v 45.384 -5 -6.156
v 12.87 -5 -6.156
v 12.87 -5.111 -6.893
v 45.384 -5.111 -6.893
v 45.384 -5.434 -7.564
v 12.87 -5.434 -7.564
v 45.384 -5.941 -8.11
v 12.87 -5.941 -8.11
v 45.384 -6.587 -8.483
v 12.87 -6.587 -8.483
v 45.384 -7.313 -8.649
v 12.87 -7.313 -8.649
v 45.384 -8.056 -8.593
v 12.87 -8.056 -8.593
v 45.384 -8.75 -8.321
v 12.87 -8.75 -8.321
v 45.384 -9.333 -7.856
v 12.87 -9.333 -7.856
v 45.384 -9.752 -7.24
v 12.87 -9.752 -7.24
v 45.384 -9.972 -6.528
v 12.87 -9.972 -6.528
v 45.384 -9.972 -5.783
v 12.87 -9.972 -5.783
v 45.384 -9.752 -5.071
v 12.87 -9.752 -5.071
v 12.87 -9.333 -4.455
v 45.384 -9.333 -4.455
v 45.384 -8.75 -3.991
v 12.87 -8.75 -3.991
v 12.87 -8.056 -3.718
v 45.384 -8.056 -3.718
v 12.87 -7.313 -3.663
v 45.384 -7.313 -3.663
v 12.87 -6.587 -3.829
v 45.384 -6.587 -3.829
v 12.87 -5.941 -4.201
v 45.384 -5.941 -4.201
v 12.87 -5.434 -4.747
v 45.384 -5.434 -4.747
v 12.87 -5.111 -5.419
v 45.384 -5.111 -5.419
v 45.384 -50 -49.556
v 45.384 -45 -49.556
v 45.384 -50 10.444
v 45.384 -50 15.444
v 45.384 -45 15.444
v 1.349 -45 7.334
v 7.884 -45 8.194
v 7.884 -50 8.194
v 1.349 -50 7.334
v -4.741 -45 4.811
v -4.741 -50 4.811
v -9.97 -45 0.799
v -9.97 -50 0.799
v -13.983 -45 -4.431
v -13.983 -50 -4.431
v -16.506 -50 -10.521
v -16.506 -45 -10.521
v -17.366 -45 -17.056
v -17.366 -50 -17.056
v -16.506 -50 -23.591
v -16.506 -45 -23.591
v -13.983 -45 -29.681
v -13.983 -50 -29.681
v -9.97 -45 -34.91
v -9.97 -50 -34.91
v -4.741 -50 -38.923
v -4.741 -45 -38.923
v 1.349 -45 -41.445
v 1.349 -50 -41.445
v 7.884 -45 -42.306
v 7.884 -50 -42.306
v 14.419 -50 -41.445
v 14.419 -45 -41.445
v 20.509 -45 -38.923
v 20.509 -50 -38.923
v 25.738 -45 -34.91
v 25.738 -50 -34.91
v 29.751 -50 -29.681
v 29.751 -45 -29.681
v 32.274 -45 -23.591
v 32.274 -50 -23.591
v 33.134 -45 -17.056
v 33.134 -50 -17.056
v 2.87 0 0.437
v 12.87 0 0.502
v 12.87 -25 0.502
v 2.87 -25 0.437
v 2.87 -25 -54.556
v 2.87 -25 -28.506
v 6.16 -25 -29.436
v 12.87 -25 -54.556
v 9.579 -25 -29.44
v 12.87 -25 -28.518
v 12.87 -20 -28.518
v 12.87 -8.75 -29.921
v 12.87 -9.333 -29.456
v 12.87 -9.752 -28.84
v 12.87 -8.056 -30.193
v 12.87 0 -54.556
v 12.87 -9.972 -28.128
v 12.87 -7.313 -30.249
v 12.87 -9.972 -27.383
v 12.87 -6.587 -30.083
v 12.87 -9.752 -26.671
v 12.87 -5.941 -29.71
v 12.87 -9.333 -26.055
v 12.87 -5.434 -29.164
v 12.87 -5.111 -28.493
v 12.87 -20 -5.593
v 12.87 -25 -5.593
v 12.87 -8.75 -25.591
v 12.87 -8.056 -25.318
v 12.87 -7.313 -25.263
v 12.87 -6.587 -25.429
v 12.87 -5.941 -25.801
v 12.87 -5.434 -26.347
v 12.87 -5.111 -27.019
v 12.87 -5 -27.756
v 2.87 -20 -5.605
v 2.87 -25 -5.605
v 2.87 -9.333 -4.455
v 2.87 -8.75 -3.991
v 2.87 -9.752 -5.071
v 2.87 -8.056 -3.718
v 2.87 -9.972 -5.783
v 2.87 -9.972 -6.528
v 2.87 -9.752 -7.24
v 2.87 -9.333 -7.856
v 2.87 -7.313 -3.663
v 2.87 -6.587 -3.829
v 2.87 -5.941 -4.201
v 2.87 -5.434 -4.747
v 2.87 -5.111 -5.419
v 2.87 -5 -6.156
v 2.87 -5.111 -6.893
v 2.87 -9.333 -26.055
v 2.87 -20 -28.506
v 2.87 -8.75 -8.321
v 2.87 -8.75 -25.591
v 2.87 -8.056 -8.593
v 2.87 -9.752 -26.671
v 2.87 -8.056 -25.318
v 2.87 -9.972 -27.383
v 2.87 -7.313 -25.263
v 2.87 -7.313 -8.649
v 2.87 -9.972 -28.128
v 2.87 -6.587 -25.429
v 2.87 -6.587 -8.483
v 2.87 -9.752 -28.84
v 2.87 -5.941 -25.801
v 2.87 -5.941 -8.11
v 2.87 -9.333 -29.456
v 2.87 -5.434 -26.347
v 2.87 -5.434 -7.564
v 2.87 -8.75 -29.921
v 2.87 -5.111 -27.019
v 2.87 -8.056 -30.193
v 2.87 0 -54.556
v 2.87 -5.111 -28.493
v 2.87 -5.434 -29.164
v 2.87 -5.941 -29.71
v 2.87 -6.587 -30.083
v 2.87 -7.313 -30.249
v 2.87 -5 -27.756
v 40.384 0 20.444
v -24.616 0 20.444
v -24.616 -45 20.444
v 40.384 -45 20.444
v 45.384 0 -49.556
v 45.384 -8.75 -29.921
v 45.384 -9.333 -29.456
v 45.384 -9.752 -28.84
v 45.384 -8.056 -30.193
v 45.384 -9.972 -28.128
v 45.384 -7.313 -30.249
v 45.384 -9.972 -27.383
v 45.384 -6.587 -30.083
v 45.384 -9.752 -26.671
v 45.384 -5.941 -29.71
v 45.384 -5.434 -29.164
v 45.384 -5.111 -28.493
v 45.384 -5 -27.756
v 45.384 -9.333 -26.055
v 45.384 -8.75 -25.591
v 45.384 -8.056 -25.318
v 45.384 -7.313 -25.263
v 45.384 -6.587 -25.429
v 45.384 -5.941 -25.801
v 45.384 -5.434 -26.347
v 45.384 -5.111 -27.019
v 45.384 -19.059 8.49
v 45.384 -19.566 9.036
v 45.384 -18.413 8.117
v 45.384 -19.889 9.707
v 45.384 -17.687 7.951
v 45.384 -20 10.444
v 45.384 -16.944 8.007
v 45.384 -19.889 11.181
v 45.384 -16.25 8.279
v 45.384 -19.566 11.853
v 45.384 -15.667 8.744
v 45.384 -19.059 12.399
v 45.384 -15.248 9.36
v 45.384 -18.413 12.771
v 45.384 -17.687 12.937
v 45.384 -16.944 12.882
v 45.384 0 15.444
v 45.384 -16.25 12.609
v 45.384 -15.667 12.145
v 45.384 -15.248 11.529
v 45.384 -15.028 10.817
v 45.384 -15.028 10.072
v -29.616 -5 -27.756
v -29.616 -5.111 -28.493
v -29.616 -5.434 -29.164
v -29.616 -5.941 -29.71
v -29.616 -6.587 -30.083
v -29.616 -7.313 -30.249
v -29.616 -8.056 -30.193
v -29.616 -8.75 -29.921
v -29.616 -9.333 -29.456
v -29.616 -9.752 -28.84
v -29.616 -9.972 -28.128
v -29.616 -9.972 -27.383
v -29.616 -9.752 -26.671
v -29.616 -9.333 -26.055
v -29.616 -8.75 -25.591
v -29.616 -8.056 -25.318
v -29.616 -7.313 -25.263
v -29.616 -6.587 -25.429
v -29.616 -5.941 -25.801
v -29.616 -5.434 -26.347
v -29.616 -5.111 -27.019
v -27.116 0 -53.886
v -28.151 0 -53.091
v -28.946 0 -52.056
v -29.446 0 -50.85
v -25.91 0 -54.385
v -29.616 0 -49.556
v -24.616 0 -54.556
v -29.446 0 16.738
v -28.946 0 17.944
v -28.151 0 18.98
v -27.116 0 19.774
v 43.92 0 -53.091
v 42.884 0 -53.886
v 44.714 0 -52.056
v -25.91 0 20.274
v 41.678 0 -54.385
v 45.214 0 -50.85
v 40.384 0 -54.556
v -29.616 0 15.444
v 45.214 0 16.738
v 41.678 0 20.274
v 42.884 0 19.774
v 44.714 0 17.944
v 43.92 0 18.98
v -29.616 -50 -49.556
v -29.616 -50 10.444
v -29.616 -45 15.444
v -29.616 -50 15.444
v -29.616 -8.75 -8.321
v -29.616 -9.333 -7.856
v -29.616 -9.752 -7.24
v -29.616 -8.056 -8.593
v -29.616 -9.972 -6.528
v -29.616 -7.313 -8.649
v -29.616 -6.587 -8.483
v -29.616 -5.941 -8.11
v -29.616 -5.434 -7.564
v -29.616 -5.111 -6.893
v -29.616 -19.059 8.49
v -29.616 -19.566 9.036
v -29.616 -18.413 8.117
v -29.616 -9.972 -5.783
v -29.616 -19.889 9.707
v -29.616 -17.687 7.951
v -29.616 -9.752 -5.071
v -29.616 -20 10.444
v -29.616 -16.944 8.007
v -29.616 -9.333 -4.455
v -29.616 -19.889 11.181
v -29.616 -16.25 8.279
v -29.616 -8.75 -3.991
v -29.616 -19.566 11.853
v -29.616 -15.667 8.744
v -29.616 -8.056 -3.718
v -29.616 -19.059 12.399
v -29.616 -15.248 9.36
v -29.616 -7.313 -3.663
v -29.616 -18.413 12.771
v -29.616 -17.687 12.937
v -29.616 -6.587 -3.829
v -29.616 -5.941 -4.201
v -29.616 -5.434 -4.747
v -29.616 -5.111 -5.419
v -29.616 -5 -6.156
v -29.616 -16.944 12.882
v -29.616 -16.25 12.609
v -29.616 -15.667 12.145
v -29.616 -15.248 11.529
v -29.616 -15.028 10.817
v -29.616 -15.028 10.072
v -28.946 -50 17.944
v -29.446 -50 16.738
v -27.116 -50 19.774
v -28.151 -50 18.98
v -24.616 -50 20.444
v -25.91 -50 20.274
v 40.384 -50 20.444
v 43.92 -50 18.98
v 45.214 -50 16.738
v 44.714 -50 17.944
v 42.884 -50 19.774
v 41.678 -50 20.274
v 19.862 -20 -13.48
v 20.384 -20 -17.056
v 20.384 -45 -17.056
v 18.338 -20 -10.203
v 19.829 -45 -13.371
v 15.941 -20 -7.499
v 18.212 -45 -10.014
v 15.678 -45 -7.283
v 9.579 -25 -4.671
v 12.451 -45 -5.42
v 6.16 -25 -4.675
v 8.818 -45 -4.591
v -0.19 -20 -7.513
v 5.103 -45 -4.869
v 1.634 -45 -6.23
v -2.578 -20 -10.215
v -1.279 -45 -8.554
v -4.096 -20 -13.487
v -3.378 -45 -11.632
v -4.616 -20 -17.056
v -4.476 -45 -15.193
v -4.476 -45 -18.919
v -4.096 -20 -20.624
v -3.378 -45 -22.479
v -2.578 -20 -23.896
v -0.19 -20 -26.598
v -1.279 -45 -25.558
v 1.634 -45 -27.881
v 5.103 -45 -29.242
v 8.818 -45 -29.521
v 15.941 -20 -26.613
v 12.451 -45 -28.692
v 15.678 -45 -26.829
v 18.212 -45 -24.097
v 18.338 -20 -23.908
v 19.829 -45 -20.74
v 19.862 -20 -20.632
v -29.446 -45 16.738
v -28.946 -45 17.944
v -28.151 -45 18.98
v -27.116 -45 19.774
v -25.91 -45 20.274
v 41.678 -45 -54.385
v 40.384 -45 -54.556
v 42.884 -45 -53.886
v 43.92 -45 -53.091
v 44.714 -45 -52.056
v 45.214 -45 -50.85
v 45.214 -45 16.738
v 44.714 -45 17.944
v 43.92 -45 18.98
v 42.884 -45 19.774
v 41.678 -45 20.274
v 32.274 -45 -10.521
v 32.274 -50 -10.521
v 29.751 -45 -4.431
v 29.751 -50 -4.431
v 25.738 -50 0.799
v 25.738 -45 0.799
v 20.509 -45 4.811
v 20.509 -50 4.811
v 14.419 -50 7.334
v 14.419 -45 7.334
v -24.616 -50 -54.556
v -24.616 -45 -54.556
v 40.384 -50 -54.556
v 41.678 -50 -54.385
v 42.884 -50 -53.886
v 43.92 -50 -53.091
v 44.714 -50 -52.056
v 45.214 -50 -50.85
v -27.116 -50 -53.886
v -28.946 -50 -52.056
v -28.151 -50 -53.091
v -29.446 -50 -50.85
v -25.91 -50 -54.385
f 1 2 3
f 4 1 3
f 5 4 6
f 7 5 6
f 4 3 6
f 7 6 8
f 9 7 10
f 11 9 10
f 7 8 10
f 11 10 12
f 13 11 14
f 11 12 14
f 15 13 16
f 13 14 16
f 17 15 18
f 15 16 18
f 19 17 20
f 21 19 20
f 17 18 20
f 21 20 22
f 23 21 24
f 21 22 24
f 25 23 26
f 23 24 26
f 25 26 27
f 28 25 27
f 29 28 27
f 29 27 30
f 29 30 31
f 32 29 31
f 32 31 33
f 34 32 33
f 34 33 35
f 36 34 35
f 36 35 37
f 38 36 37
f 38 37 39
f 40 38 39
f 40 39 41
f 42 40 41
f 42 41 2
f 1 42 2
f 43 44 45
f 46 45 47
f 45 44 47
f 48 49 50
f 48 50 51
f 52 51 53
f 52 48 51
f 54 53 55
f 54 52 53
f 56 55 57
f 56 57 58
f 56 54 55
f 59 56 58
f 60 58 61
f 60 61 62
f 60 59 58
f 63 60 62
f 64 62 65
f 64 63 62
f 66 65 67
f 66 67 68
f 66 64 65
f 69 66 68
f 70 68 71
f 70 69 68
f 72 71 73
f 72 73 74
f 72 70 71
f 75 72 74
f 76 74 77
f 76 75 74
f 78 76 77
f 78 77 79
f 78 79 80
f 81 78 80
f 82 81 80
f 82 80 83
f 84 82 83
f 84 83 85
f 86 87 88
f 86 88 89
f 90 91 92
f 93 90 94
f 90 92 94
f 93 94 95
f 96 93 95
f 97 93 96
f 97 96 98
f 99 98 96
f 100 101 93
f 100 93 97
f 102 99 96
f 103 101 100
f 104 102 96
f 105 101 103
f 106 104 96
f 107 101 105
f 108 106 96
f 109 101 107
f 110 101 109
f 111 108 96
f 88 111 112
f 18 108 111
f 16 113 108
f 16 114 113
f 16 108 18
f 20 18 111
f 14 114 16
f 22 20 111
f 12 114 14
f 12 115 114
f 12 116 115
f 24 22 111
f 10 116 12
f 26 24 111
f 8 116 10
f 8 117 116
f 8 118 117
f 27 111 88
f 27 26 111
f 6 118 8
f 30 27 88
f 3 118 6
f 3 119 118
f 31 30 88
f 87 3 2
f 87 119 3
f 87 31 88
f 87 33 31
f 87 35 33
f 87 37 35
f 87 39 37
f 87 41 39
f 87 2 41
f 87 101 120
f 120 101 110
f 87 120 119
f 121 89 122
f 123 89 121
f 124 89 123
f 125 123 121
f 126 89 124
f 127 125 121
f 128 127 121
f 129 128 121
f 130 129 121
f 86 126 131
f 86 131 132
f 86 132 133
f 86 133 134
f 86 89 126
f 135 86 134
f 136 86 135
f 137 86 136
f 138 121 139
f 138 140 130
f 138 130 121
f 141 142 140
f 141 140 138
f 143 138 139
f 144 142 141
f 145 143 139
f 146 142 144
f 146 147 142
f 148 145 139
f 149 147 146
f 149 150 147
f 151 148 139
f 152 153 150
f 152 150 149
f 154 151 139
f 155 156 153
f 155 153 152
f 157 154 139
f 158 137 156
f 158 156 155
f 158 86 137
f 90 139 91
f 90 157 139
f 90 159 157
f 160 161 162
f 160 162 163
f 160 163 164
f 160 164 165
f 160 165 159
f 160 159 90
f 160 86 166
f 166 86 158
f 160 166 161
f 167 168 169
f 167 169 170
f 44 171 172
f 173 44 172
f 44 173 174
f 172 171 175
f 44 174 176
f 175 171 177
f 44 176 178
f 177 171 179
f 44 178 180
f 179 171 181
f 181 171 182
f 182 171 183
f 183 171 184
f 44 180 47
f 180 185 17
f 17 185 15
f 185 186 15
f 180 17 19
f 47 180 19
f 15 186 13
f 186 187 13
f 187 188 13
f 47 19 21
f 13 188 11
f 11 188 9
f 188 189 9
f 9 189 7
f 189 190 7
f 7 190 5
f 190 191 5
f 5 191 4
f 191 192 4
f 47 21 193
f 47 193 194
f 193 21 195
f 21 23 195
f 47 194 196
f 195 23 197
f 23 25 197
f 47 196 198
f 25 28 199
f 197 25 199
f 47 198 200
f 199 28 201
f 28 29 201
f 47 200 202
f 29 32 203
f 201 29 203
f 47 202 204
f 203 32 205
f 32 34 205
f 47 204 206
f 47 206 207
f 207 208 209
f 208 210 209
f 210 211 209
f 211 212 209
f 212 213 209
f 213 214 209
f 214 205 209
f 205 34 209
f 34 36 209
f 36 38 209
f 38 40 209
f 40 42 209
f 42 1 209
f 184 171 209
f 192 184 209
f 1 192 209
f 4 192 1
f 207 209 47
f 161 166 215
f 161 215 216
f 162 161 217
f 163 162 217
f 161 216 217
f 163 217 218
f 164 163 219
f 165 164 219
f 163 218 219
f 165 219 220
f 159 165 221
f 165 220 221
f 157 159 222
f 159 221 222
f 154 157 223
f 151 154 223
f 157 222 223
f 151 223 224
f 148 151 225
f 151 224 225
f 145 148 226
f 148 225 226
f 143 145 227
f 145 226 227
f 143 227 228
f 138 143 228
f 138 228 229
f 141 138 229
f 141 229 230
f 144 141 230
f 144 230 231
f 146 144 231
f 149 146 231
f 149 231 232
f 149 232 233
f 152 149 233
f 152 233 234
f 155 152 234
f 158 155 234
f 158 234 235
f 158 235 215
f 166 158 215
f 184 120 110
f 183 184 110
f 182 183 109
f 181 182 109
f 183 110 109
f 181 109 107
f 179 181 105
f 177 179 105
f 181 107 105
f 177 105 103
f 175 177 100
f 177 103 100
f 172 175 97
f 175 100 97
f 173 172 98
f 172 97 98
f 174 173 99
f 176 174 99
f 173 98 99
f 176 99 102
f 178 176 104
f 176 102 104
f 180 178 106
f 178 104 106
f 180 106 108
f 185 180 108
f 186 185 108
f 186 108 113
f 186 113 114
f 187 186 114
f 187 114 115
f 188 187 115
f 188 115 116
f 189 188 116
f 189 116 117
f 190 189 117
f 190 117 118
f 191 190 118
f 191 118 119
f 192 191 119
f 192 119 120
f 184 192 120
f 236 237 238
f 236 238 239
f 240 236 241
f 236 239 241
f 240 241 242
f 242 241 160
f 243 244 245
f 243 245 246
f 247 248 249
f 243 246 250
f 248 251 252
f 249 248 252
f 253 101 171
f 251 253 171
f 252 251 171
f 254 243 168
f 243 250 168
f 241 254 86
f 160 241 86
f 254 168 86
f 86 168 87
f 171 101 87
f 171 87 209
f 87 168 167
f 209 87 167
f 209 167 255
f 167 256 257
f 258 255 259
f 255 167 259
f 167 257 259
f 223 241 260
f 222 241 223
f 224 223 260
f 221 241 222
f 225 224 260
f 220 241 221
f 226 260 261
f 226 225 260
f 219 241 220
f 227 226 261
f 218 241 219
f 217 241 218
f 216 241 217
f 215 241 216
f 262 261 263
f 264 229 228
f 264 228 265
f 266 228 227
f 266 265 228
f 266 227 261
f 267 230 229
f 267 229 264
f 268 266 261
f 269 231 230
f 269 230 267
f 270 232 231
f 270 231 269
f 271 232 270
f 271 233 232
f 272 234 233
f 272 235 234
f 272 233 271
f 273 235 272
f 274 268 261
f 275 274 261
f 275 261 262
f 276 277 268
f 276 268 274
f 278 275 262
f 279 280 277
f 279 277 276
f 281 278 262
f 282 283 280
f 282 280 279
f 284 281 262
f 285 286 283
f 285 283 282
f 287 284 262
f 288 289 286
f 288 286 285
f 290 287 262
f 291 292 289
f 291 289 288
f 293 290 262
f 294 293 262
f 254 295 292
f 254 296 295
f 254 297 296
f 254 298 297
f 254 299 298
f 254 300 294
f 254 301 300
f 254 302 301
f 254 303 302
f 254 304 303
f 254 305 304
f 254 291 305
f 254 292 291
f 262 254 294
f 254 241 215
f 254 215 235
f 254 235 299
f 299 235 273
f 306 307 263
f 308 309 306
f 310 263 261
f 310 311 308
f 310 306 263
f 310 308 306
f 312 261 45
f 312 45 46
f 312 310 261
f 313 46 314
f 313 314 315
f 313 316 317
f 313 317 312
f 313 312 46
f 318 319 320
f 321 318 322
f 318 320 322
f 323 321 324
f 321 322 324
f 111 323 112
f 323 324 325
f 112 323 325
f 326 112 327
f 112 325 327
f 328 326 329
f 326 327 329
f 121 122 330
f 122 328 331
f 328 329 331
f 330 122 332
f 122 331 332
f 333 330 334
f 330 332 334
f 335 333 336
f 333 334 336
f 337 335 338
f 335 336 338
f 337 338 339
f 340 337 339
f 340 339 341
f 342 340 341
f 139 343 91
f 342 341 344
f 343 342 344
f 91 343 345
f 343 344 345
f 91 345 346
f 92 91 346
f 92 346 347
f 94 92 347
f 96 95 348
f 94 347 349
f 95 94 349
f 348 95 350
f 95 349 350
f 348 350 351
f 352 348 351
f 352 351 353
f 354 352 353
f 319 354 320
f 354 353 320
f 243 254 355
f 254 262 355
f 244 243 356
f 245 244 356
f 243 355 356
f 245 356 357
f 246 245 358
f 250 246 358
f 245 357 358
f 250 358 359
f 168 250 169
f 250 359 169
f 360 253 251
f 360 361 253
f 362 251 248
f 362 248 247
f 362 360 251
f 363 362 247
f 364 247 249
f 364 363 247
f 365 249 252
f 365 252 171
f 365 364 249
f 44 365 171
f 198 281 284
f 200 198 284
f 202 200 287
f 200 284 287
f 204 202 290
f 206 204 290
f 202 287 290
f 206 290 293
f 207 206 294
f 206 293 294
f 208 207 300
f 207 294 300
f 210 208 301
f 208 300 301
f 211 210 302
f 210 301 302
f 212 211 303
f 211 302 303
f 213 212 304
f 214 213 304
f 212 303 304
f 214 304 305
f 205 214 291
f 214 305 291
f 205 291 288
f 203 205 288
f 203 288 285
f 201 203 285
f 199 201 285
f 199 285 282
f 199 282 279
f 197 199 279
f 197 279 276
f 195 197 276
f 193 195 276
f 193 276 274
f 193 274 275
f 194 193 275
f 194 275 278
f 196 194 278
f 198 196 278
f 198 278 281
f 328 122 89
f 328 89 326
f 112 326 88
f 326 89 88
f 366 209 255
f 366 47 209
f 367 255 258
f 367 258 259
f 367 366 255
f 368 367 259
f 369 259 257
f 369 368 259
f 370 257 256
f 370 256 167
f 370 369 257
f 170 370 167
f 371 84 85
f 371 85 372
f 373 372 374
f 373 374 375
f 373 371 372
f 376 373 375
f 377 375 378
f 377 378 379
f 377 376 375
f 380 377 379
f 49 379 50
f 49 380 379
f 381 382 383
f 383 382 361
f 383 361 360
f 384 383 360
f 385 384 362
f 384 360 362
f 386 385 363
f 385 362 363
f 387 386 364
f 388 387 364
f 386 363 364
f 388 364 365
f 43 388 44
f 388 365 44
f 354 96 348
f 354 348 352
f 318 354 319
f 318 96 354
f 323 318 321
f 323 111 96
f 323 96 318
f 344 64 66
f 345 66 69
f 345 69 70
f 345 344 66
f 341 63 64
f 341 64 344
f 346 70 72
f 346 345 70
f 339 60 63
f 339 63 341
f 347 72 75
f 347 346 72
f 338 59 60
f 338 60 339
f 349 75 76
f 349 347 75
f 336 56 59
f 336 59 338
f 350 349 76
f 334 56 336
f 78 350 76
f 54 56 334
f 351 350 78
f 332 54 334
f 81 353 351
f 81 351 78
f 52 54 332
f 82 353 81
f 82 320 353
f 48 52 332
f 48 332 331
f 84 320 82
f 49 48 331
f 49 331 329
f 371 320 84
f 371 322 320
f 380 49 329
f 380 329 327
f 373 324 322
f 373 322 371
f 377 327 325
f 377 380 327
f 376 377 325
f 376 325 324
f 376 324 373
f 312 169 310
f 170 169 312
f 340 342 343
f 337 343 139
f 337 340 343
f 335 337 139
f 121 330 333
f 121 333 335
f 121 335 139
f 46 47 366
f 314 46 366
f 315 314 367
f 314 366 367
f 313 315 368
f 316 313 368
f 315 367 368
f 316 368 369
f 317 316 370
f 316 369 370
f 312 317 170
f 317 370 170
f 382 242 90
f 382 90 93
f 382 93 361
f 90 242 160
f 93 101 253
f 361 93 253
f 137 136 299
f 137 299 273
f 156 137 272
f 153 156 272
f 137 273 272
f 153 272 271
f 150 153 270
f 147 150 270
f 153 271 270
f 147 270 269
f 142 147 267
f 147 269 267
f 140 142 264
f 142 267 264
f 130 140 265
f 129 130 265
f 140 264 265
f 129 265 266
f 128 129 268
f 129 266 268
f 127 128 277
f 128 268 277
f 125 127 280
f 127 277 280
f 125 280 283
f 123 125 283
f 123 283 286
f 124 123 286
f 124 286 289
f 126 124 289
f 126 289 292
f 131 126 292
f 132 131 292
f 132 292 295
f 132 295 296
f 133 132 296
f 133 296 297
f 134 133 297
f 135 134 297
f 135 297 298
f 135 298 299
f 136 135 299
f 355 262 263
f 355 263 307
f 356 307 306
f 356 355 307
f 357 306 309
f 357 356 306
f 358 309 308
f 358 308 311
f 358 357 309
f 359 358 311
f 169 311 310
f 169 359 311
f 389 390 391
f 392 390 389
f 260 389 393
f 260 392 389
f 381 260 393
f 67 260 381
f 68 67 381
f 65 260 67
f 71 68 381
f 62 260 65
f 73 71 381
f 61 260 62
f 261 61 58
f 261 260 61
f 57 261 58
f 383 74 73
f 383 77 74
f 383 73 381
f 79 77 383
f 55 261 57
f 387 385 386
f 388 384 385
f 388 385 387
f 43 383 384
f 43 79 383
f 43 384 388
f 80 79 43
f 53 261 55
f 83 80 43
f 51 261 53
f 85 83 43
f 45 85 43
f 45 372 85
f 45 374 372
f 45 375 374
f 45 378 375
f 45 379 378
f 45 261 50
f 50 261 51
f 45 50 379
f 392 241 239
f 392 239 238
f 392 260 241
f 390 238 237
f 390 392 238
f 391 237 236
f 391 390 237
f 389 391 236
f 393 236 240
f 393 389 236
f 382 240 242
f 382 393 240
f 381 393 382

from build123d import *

# Parameters (mm, degrees)
F0_W      = 75
F0_H      = 75
F1_DEPTH  = 45
F2_R      = 5
F3_R      = 12.5
F4_DEPTH  = 25
F7_DEPTH  = 25
F9_DEPTH  = 75.001
F10_DEPTH = 25
F11_R     = 2.5
F12_DEPTH = 75.001
F13_DEPTH = 25
F14_DEPTH = 20


with BuildPart() as f1:
    # F0 (on Front) → F1 (new body)
    with BuildSketch(Plane.XZ):
        with Locations((7.8840382397, -17.0557253063)):
            Rectangle(F0_W, F0_H)
    extrude(amount=F1_DEPTH)

    # F2
    f2_edges = [f1.edges().sort_by_distance(p)[0] for p in [
        (-29.615962, -22.5, 20.444275),
        (-29.615962, -22.5, -54.555725),
        (45.384038, -22.5, -54.555725),
        (45.384038, -22.5, 20.444275),
    ]]
    fillet(f2_edges, radius=F2_R)

    # F3 (on face) → F4 (cut)
    with BuildSketch(Plane.XZ.offset(45)):
        with Locations((7.8840382397, -17.0557253063)):
            Circle(F3_R)
    extrude(amount=-F4_DEPTH, mode=Mode.SUBTRACT)

    # F6 (on face) → F7 (cut)
    with BuildSketch(Plane.XZ):
        Polygon((12.8703957796, 0.5023097037), (2.8703957796, 0.4370668321), (2.8703957796, -54.635066539), (12.8703957796, -54.635066539), align=None)
    extrude(amount=F7_DEPTH, mode=Mode.SUBTRACT)

    # F8 (on face) → F9 (cut, through all)
    with BuildSketch(Plane(origin=(-29.6159617603, 0, 0), x_dir=(0, -1, 0), z_dir=(-1, 0, 0))):
        with BuildLine():
            ThreePointArc((10, -27.7557253063), (7.5, -25.2557253063), (5, -27.7557253063))
            ThreePointArc((5, -27.7557253063), (7.5, -30.2557253063), (10, -27.7557253063))
        make_face()
        with BuildLine():
            ThreePointArc((10, -6.1557253063), (7.5, -3.6557253063), (5, -6.1557253063))
            ThreePointArc((5, -6.1557253063), (7.5, -8.6557253063), (10, -6.1557253063))
        make_face()
    extrude(amount=-F9_DEPTH, mode=Mode.SUBTRACT)

    # F10 (add): a face of the model
    f10_faces = [f1.faces().sort_by_distance(p)[0] for p in [
        (44.3233780679, -45, -17.0557253063),
    ]]
    extrude(f10_faces, amount=F10_DEPTH)

    # F11 (on face) → F12 (cut, through all)
    with BuildSketch(Plane(origin=(-29.6159617603, 0, 0), x_dir=(0, -1, 0), z_dir=(-1, 0, 0))):
        with BuildLine():
            ThreePointArc((55, 10.4442746937), (54.267766953, 12.2120416467), (52.5, 12.9442746937))
            Line((52.5, 12.9442746937), (52.5, 10.4442746937))
            Line((52.5, 10.4442746937), (50, 10.4442746937))
            ThreePointArc((50, 10.4442746937), (52.5, 7.9442746937), (55, 10.4442746937))
        make_face()
        with Locations((17.5, 10.4442746937)):
            Circle(F11_R)
        with BuildLine():
            Line((52.5, 10.4442746937), (52.5, 12.9442746937))
            ThreePointArc((52.5, 12.9442746937), (50.732233047, 12.2120416467), (50, 10.4442746937))
            Line((50, 10.4442746937), (52.5, 10.4442746937))
        make_face()
    extrude(amount=-F12_DEPTH, mode=Mode.SUBTRACT)

    # F5 (on face) → F13 (cut)
    with BuildSketch(Plane.XZ.offset(45)):
        with BuildLine():
            ThreePointArc((7.8840382397, 8.1942746937), (-9.9704079852, -34.9101715312), (33.1340382397, -17.0557253063))
            ThreePointArc((33.1340382397, -17.0557253063), (25.7384844647, 0.7987209187), (7.8840382397, 8.1942746937))
        make_face()
    extrude(amount=F13_DEPTH, mode=Mode.SUBTRACT)

    # F14 (cut): a face of the model
    f14_faces = [f1.faces().sort_by_distance(p)[0] for p in [
        (44.3233780679, -70, -17.0557253063),
    ]]
    extrude(f14_faces, amount=-F14_DEPTH, mode=Mode.SUBTRACT)


solid = f1.part
